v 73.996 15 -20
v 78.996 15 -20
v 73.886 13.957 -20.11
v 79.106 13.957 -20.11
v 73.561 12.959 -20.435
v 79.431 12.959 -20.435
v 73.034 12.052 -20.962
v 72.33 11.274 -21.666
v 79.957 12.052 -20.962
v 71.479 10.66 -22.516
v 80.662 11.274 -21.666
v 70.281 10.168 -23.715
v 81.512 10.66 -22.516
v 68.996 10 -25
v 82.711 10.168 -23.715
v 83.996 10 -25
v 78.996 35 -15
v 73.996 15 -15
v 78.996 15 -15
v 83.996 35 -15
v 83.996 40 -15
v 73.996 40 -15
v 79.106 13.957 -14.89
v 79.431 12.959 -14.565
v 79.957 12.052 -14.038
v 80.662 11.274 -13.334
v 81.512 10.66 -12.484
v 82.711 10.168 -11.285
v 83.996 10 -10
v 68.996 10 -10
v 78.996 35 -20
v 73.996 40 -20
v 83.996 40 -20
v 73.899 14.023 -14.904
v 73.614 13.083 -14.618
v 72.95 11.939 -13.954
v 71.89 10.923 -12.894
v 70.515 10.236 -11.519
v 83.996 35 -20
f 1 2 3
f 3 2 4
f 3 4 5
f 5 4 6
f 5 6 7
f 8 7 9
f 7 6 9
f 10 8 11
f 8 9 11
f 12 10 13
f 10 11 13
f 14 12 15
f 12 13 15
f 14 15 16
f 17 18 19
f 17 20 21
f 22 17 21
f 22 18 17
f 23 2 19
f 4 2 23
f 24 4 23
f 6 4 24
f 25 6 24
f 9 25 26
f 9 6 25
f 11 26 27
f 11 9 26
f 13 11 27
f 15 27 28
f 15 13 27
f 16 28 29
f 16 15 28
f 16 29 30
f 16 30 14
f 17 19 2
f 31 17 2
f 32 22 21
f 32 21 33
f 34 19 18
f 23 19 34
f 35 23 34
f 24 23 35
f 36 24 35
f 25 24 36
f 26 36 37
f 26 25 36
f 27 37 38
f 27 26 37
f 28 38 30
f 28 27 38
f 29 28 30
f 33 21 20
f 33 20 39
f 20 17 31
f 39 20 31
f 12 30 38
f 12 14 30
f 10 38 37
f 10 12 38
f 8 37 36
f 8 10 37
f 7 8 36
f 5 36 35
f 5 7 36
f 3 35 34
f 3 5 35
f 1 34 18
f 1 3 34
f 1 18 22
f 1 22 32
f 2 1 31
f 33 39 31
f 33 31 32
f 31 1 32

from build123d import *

# Parameters (mm, degrees)
SKETCH1_R           = 5
SKETCH1_R_2         = 10.05
BOSS_EXTRUDE1_DEPTH = 10
SKETCH2_R           = 1.25
CUT_EXTRUDE1_DEPTH  = 10
SKETCH4_R           = 7.5
BOSS_EXTRUDE2_DEPTH = 30
BOSS_EXTRUDE2_TAPER = 7
SKETCH5_R           = 1.25
CUT_EXTRUDE2_DEPTH  = 10
FILLET1_R           = 15
SKETCH6_W           = 5
SKETCH6_H           = 5
BOSS_EXTRUDE3_DEPTH = 30
SKETCH7_W           = 5
SKETCH7_H           = 5
BOSS_EXTRUDE4_DEPTH = 5
FILLET2_R           = 5
SKETCH8_W           = 100
SKETCH8_H           = 10
CUT_EXTRUDE4_DEPTH  = 100


# Some blends are built 0.0001 mm under size
with BuildPart() as part:
    # Sketch1 → Boss-Extrude1 (new body)
    with BuildSketch(Plane(origin=(0, 0, 0), x_dir=(1, 0, 0), z_dir=(0, 1, 0))):
        Polygon((23.995878661, -35), (56.995878661, -35), (56.995878661, -75), (88.995878661, -75), (88.995878661, -25), (88.995878661, 25), (17.5, 25), (-2.004121339, 25), (-2.004121339, 7.840472806), (23.995878661, 7.840472806), (23.995878661, 0), (23.995878661, -28.53803828), (10.495878661, -28.53803828), (10.495878661, -35), align=None)
        with Locations(Location((51.495878661, 0, 0), (0, 0, 270))):
            Circle(SKETCH1_R, mode=Mode.SUBTRACT)
        with Locations(Location((73.995878661, -60, 0), (0, 0, 270))):
            Circle(SKETCH1_R_2, mode=Mode.SUBTRACT)
    extrude(amount=BOSS_EXTRUDE1_DEPTH)

    # Sketch2 → Cut-Extrude1 (cut)
    with BuildSketch(Plane.ZY.offset(-10.495878661)):
        with Locations((31.76901914, 5)):
            Circle(SKETCH2_R)
    extrude(amount=-CUT_EXTRUDE1_DEPTH, mode=Mode.SUBTRACT)

    # Sketch4 → Boss-Extrude2 (add)
    with BuildSketch(Plane(origin=(0, 10, 0), x_dir=(1, 0, 0), z_dir=(0, 1, 0))):
        with Locations((6.495878661, 16.5)):
            Circle(SKETCH4_R)
    extrude(amount=BOSS_EXTRUDE2_DEPTH, taper=BOSS_EXTRUDE2_TAPER)

    # Sketch5 → Cut-Extrude2 (cut)
    with BuildSketch(Plane(origin=(0, 40, 0), x_dir=(1, 0, 0), z_dir=(0, 1, 0))):
        with Locations(Location((6.495878661, 16.5, 0), (0, 0, 270))):
            Circle(SKETCH5_R)
    extrude(amount=-CUT_EXTRUDE2_DEPTH, mode=Mode.SUBTRACT)

    # Fillet1
    # the kernel refuses this fillet: 15 mm, written as the material it adds along each edge
    with BuildSketch(Plane(origin=(56.995878661, 0, 35), x_dir=(-1, 0, 0), z_dir=(0, 1, 0)), Plane(origin=(23.995878661, 0, -7.840472806), x_dir=(-1, 0, 0), z_dir=(0, 1, 0))) as fillet1_piece_1:
        with BuildLine():
            CenterArc((FILLET1_R, FILLET1_R), FILLET1_R, 180, 90)
            Line((0, FILLET1_R), (-FILLET1_R * 0.02, FILLET1_R))
            Line((-FILLET1_R * 0.02, FILLET1_R), (-FILLET1_R * 0.02, -FILLET1_R * 0.02))
            Line((-FILLET1_R * 0.02, -FILLET1_R * 0.02), (FILLET1_R, -FILLET1_R * 0.02))
            Line((FILLET1_R, -FILLET1_R * 0.02), (FILLET1_R, 0))
        make_face()
    extrude(amount=10)
    with BuildSketch(Plane(origin=(23.995878661, 0, 28.53803828), x_dir=(0, 0, -1), z_dir=(0, 1, 0))) as fillet1_piece_2:
        with BuildLine():
            CenterArc((14.924811557, 15), FILLET1_R, 185.739170477, 84.260829523)
            Line((0, 13.5), (-0.298496231, 13.47))
            ThreePointArc((-0.298496231, 13.47), (-0.3, 6.75), (-0.3, 0))
            Line((-0.3, 0), (0, -0.3))
            Line((0, -0.3), (14.924811557, -0.3))
            Line((14.924811557, -0.3), (14.924811557, 0))
        make_face()
    extrude(amount=10)

    # Sketch6 → Boss-Extrude3 (add)
    with BuildSketch(Plane(origin=(0, 10, 0), x_dir=(1, 0, 0), z_dir=(0, 1, 0))):
        with Locations((76.495878661, 17.5)):
            Rectangle(SKETCH6_W, SKETCH6_H)
    extrude(amount=BOSS_EXTRUDE3_DEPTH)

    # Sketch7 → Boss-Extrude4 (add)
    with BuildSketch(Plane(origin=(78.995878661, 0, 0), x_dir=(0, 0, -1), z_dir=(1, 0, 0))):
        with Locations((17.5, 37.5)):
            Rectangle(SKETCH7_W, SKETCH7_H)
    extrude(amount=BOSS_EXTRUDE4_DEPTH)

    # Fillet2
    fillet2_edges = [part.edges().sort_by_distance(p)[0] for p in [
        (78.995878661, 10, -17.5),
        (76.495878661, 10, -20),
        (73.995878661, 10, -17.5),
        (76.495878661, 10, -15),
    ]]
    fillet(fillet2_edges, radius=FILLET2_R - 0.0001)  # a hair under: the kernel refuses the full size

    # Sketch8 → Cut-Extrude4 (cut)
    with BuildSketch(Plane(origin=(88.995878661, 0, 0), x_dir=(0, 0, -1), z_dir=(1, 0, 0))):
        with Locations((-25, 5)):
            Rectangle(SKETCH8_W, SKETCH8_H)
    extrude(amount=-CUT_EXTRUDE4_DEPTH, mode=Mode.SUBTRACT)


with BuildPart() as cut_extrude4_kept_piece:
    # of the separate pieces the step leaves, the one the design keeps (cut_extrude4_pieces_kept)
    add(part.part.solids().sort_by_distance((83.995778661, 10, -24.9999))[0])


solid = cut_extrude4_kept_piece.part
